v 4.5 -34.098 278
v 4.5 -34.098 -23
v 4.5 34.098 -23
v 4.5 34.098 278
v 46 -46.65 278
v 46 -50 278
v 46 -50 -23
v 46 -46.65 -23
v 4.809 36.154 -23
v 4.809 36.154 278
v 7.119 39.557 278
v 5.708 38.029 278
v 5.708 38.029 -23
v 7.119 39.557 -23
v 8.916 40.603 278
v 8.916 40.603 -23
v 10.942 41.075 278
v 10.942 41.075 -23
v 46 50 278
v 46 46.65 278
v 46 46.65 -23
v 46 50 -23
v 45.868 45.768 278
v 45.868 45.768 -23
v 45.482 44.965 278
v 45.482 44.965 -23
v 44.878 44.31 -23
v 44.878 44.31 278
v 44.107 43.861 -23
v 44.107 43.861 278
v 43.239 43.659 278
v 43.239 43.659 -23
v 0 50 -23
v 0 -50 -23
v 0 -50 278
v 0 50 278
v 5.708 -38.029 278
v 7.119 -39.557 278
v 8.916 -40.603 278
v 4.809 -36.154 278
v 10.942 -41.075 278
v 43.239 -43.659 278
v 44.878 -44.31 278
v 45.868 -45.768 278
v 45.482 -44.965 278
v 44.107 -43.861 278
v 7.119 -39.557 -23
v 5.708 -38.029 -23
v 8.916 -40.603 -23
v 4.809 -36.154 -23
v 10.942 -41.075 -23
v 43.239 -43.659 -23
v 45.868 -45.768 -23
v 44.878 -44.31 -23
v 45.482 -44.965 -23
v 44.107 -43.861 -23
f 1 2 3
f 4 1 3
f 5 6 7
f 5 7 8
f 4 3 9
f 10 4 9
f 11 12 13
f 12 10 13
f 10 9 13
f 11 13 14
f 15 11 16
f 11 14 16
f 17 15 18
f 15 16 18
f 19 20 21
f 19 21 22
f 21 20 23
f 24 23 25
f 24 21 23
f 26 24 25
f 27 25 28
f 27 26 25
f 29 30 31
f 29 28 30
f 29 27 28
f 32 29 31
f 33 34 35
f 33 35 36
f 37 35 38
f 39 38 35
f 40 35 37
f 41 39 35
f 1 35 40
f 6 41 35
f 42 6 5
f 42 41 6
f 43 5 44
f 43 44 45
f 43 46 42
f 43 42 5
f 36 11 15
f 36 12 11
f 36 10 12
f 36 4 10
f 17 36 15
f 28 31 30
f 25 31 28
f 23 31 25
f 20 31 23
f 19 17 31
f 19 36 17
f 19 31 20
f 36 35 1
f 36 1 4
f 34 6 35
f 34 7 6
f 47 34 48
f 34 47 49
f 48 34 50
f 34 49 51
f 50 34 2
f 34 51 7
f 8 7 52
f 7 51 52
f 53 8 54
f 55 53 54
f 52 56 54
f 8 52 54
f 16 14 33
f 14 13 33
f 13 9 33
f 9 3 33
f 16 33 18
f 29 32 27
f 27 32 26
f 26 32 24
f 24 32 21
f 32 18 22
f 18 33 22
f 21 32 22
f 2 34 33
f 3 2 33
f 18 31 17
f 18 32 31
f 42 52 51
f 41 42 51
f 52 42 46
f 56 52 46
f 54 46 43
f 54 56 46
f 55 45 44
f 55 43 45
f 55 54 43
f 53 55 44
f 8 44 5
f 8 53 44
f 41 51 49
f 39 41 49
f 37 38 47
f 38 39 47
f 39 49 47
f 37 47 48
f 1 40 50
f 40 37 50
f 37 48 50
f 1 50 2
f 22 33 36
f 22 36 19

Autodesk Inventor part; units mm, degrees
ref_plane "Начальная плоскость" through (0, 0, -23) normal (0, 0, 1) x (1, 0, 0)
ref_plane "Конечная плоскость" through (0, 0, 278) normal (0, 0, 1) x (1, 0, 0)
sketch "Эскиз" plane through (0, 0, 0) normal (0, 0, 1) x (1, 0, 0)
  line L0 (46, -50) -> (0, -50)
  line L1 (46, -50) -> (46, -46.6496)
  line L2 (43.2392, -43.6591) -> (10.9418, -41.0753)
  line L3 (4.5, -34.0976) -> (4.5, 34.0976)
  line L4 (43.2392, 43.6591) -> (10.9418, 41.0753)
  line L5 (46, 46.6496) -> (46, 50)
  line L6 (0, 50) -> (46, 50)
  line L7 (0, -50) -> (0, 50)
  arc A0 (4.5, -34.0976) -> (10.9418, -41.0753) centre (11.5, -34.0976) ccw
  arc A1 (10.9418, 41.0753) -> (4.5, 34.0976) centre (11.5, 34.0976) ccw
  arc A2 (46, -46.6496) -> (43.2392, -43.6591) centre (43, -46.6496) ccw
  arc A3 (43.2392, 43.6591) -> (46, 46.6496) centre (43, 46.6496) ccw
  line L8 (0, 70) -> (0, -70) construction
  line L9 (-9.3169, 0) -> (55.9016, 0) construction
  point P0 (46, -43.88)
  point P1 (4.5, -40.56)
  point P2 (4.5, 40.56)
  point P3 (46, 43.88)
  dimension "d3" = 46
  dimension "d5" = 4.5
  dimension "d7" = 100
  dimension "d9" = 9.44
  dimension "d11" = 9.44
  dimension "d13" = 6.12
  dimension "d15" = 6.12
  dimension "d22" = 7
  dimension "d23" = 3
  dimension "d24" = 50
  dimension "d25" = 0
extrude "Тело" add sketch "Эскиз" along normal up to surface (301 mm away) from surface at -23
sketch "Sketch3" plane through (0, 0, 0) normal (0, 0, 1) x (1, 0, 0)
  line L0 (0, 0) -> (10, 0)
ref_plane "Work Plane7" through (0, 0, 0) normal (0, -1, 0) x (1, 0, 0)
sketch "Sketch4" plane through (0, 0, 0) normal (0, -1, 0) x (1, 0, 0)
  line L0 (-2, -23) -> (12, -23)
  line L1 (-2, 278) -> (12, 278)
  dimension "d29" = 301
ref_plane "РабПлоскость8" through (23, -46.6496, 278) normal (0, 0, 1) x (1, 0, 0)
split "Разделение1" plane through (23, -46.6496, 278) removes the side toward (0, 0, 1)
ref_plane "РабПлоскость9" through (-427, -46.6496, -23) normal (0, 0, -1) x (-1, 0, 0)
split "Разделение2" plane through (-427, -46.6496, -23) removes the side toward (0, 0, -1)
equation "\"d3\" = b"
equation "\"d5\" = t1"
equation "\"d7\" = ParH"
equation "\"d9\" = msp_x1 + t2"
equation "\"d11\" = msp_x1 + t2"
equation "\"d13\" = -msp_x2 + t2"
equation "\"d15\" = -msp_x2 + t2"
equation "\"d22\" = R"
equation "\"d23\" = R1"
equation "\"d24\" = 0.5 * d7"
equation "\"d16\" = G_L"
equation "\"R1\" = 3"
equation "\"R\" = 7"
equation "\"t1\" = 4.5"
equation "\"t2\" = 7.6"
equation "\"ParH\" = 100"
equation "\"b\" = 46"
equation "\"msp_x1\" = 0.04 * b"
equation "\"msp_x2\" = -0.08 * t1 + 0.04 * b"
equation "\"G_L\" = d29"
equation "\"ex\" = 0"
equation "\"G_OFFSET_START\" = 23"
equation "\"G_OFFSET_END\" = 23"
equation "\"d26\" = -G_OFFSET_START"
equation "\"d27\" = G_OFFSET_END + B_L"
equation "\"B_L\" = 255"
properties part number "Швеллер 10U-301 ГОСТ 8240-97" material "Сталь, мягкая, сварочная"
